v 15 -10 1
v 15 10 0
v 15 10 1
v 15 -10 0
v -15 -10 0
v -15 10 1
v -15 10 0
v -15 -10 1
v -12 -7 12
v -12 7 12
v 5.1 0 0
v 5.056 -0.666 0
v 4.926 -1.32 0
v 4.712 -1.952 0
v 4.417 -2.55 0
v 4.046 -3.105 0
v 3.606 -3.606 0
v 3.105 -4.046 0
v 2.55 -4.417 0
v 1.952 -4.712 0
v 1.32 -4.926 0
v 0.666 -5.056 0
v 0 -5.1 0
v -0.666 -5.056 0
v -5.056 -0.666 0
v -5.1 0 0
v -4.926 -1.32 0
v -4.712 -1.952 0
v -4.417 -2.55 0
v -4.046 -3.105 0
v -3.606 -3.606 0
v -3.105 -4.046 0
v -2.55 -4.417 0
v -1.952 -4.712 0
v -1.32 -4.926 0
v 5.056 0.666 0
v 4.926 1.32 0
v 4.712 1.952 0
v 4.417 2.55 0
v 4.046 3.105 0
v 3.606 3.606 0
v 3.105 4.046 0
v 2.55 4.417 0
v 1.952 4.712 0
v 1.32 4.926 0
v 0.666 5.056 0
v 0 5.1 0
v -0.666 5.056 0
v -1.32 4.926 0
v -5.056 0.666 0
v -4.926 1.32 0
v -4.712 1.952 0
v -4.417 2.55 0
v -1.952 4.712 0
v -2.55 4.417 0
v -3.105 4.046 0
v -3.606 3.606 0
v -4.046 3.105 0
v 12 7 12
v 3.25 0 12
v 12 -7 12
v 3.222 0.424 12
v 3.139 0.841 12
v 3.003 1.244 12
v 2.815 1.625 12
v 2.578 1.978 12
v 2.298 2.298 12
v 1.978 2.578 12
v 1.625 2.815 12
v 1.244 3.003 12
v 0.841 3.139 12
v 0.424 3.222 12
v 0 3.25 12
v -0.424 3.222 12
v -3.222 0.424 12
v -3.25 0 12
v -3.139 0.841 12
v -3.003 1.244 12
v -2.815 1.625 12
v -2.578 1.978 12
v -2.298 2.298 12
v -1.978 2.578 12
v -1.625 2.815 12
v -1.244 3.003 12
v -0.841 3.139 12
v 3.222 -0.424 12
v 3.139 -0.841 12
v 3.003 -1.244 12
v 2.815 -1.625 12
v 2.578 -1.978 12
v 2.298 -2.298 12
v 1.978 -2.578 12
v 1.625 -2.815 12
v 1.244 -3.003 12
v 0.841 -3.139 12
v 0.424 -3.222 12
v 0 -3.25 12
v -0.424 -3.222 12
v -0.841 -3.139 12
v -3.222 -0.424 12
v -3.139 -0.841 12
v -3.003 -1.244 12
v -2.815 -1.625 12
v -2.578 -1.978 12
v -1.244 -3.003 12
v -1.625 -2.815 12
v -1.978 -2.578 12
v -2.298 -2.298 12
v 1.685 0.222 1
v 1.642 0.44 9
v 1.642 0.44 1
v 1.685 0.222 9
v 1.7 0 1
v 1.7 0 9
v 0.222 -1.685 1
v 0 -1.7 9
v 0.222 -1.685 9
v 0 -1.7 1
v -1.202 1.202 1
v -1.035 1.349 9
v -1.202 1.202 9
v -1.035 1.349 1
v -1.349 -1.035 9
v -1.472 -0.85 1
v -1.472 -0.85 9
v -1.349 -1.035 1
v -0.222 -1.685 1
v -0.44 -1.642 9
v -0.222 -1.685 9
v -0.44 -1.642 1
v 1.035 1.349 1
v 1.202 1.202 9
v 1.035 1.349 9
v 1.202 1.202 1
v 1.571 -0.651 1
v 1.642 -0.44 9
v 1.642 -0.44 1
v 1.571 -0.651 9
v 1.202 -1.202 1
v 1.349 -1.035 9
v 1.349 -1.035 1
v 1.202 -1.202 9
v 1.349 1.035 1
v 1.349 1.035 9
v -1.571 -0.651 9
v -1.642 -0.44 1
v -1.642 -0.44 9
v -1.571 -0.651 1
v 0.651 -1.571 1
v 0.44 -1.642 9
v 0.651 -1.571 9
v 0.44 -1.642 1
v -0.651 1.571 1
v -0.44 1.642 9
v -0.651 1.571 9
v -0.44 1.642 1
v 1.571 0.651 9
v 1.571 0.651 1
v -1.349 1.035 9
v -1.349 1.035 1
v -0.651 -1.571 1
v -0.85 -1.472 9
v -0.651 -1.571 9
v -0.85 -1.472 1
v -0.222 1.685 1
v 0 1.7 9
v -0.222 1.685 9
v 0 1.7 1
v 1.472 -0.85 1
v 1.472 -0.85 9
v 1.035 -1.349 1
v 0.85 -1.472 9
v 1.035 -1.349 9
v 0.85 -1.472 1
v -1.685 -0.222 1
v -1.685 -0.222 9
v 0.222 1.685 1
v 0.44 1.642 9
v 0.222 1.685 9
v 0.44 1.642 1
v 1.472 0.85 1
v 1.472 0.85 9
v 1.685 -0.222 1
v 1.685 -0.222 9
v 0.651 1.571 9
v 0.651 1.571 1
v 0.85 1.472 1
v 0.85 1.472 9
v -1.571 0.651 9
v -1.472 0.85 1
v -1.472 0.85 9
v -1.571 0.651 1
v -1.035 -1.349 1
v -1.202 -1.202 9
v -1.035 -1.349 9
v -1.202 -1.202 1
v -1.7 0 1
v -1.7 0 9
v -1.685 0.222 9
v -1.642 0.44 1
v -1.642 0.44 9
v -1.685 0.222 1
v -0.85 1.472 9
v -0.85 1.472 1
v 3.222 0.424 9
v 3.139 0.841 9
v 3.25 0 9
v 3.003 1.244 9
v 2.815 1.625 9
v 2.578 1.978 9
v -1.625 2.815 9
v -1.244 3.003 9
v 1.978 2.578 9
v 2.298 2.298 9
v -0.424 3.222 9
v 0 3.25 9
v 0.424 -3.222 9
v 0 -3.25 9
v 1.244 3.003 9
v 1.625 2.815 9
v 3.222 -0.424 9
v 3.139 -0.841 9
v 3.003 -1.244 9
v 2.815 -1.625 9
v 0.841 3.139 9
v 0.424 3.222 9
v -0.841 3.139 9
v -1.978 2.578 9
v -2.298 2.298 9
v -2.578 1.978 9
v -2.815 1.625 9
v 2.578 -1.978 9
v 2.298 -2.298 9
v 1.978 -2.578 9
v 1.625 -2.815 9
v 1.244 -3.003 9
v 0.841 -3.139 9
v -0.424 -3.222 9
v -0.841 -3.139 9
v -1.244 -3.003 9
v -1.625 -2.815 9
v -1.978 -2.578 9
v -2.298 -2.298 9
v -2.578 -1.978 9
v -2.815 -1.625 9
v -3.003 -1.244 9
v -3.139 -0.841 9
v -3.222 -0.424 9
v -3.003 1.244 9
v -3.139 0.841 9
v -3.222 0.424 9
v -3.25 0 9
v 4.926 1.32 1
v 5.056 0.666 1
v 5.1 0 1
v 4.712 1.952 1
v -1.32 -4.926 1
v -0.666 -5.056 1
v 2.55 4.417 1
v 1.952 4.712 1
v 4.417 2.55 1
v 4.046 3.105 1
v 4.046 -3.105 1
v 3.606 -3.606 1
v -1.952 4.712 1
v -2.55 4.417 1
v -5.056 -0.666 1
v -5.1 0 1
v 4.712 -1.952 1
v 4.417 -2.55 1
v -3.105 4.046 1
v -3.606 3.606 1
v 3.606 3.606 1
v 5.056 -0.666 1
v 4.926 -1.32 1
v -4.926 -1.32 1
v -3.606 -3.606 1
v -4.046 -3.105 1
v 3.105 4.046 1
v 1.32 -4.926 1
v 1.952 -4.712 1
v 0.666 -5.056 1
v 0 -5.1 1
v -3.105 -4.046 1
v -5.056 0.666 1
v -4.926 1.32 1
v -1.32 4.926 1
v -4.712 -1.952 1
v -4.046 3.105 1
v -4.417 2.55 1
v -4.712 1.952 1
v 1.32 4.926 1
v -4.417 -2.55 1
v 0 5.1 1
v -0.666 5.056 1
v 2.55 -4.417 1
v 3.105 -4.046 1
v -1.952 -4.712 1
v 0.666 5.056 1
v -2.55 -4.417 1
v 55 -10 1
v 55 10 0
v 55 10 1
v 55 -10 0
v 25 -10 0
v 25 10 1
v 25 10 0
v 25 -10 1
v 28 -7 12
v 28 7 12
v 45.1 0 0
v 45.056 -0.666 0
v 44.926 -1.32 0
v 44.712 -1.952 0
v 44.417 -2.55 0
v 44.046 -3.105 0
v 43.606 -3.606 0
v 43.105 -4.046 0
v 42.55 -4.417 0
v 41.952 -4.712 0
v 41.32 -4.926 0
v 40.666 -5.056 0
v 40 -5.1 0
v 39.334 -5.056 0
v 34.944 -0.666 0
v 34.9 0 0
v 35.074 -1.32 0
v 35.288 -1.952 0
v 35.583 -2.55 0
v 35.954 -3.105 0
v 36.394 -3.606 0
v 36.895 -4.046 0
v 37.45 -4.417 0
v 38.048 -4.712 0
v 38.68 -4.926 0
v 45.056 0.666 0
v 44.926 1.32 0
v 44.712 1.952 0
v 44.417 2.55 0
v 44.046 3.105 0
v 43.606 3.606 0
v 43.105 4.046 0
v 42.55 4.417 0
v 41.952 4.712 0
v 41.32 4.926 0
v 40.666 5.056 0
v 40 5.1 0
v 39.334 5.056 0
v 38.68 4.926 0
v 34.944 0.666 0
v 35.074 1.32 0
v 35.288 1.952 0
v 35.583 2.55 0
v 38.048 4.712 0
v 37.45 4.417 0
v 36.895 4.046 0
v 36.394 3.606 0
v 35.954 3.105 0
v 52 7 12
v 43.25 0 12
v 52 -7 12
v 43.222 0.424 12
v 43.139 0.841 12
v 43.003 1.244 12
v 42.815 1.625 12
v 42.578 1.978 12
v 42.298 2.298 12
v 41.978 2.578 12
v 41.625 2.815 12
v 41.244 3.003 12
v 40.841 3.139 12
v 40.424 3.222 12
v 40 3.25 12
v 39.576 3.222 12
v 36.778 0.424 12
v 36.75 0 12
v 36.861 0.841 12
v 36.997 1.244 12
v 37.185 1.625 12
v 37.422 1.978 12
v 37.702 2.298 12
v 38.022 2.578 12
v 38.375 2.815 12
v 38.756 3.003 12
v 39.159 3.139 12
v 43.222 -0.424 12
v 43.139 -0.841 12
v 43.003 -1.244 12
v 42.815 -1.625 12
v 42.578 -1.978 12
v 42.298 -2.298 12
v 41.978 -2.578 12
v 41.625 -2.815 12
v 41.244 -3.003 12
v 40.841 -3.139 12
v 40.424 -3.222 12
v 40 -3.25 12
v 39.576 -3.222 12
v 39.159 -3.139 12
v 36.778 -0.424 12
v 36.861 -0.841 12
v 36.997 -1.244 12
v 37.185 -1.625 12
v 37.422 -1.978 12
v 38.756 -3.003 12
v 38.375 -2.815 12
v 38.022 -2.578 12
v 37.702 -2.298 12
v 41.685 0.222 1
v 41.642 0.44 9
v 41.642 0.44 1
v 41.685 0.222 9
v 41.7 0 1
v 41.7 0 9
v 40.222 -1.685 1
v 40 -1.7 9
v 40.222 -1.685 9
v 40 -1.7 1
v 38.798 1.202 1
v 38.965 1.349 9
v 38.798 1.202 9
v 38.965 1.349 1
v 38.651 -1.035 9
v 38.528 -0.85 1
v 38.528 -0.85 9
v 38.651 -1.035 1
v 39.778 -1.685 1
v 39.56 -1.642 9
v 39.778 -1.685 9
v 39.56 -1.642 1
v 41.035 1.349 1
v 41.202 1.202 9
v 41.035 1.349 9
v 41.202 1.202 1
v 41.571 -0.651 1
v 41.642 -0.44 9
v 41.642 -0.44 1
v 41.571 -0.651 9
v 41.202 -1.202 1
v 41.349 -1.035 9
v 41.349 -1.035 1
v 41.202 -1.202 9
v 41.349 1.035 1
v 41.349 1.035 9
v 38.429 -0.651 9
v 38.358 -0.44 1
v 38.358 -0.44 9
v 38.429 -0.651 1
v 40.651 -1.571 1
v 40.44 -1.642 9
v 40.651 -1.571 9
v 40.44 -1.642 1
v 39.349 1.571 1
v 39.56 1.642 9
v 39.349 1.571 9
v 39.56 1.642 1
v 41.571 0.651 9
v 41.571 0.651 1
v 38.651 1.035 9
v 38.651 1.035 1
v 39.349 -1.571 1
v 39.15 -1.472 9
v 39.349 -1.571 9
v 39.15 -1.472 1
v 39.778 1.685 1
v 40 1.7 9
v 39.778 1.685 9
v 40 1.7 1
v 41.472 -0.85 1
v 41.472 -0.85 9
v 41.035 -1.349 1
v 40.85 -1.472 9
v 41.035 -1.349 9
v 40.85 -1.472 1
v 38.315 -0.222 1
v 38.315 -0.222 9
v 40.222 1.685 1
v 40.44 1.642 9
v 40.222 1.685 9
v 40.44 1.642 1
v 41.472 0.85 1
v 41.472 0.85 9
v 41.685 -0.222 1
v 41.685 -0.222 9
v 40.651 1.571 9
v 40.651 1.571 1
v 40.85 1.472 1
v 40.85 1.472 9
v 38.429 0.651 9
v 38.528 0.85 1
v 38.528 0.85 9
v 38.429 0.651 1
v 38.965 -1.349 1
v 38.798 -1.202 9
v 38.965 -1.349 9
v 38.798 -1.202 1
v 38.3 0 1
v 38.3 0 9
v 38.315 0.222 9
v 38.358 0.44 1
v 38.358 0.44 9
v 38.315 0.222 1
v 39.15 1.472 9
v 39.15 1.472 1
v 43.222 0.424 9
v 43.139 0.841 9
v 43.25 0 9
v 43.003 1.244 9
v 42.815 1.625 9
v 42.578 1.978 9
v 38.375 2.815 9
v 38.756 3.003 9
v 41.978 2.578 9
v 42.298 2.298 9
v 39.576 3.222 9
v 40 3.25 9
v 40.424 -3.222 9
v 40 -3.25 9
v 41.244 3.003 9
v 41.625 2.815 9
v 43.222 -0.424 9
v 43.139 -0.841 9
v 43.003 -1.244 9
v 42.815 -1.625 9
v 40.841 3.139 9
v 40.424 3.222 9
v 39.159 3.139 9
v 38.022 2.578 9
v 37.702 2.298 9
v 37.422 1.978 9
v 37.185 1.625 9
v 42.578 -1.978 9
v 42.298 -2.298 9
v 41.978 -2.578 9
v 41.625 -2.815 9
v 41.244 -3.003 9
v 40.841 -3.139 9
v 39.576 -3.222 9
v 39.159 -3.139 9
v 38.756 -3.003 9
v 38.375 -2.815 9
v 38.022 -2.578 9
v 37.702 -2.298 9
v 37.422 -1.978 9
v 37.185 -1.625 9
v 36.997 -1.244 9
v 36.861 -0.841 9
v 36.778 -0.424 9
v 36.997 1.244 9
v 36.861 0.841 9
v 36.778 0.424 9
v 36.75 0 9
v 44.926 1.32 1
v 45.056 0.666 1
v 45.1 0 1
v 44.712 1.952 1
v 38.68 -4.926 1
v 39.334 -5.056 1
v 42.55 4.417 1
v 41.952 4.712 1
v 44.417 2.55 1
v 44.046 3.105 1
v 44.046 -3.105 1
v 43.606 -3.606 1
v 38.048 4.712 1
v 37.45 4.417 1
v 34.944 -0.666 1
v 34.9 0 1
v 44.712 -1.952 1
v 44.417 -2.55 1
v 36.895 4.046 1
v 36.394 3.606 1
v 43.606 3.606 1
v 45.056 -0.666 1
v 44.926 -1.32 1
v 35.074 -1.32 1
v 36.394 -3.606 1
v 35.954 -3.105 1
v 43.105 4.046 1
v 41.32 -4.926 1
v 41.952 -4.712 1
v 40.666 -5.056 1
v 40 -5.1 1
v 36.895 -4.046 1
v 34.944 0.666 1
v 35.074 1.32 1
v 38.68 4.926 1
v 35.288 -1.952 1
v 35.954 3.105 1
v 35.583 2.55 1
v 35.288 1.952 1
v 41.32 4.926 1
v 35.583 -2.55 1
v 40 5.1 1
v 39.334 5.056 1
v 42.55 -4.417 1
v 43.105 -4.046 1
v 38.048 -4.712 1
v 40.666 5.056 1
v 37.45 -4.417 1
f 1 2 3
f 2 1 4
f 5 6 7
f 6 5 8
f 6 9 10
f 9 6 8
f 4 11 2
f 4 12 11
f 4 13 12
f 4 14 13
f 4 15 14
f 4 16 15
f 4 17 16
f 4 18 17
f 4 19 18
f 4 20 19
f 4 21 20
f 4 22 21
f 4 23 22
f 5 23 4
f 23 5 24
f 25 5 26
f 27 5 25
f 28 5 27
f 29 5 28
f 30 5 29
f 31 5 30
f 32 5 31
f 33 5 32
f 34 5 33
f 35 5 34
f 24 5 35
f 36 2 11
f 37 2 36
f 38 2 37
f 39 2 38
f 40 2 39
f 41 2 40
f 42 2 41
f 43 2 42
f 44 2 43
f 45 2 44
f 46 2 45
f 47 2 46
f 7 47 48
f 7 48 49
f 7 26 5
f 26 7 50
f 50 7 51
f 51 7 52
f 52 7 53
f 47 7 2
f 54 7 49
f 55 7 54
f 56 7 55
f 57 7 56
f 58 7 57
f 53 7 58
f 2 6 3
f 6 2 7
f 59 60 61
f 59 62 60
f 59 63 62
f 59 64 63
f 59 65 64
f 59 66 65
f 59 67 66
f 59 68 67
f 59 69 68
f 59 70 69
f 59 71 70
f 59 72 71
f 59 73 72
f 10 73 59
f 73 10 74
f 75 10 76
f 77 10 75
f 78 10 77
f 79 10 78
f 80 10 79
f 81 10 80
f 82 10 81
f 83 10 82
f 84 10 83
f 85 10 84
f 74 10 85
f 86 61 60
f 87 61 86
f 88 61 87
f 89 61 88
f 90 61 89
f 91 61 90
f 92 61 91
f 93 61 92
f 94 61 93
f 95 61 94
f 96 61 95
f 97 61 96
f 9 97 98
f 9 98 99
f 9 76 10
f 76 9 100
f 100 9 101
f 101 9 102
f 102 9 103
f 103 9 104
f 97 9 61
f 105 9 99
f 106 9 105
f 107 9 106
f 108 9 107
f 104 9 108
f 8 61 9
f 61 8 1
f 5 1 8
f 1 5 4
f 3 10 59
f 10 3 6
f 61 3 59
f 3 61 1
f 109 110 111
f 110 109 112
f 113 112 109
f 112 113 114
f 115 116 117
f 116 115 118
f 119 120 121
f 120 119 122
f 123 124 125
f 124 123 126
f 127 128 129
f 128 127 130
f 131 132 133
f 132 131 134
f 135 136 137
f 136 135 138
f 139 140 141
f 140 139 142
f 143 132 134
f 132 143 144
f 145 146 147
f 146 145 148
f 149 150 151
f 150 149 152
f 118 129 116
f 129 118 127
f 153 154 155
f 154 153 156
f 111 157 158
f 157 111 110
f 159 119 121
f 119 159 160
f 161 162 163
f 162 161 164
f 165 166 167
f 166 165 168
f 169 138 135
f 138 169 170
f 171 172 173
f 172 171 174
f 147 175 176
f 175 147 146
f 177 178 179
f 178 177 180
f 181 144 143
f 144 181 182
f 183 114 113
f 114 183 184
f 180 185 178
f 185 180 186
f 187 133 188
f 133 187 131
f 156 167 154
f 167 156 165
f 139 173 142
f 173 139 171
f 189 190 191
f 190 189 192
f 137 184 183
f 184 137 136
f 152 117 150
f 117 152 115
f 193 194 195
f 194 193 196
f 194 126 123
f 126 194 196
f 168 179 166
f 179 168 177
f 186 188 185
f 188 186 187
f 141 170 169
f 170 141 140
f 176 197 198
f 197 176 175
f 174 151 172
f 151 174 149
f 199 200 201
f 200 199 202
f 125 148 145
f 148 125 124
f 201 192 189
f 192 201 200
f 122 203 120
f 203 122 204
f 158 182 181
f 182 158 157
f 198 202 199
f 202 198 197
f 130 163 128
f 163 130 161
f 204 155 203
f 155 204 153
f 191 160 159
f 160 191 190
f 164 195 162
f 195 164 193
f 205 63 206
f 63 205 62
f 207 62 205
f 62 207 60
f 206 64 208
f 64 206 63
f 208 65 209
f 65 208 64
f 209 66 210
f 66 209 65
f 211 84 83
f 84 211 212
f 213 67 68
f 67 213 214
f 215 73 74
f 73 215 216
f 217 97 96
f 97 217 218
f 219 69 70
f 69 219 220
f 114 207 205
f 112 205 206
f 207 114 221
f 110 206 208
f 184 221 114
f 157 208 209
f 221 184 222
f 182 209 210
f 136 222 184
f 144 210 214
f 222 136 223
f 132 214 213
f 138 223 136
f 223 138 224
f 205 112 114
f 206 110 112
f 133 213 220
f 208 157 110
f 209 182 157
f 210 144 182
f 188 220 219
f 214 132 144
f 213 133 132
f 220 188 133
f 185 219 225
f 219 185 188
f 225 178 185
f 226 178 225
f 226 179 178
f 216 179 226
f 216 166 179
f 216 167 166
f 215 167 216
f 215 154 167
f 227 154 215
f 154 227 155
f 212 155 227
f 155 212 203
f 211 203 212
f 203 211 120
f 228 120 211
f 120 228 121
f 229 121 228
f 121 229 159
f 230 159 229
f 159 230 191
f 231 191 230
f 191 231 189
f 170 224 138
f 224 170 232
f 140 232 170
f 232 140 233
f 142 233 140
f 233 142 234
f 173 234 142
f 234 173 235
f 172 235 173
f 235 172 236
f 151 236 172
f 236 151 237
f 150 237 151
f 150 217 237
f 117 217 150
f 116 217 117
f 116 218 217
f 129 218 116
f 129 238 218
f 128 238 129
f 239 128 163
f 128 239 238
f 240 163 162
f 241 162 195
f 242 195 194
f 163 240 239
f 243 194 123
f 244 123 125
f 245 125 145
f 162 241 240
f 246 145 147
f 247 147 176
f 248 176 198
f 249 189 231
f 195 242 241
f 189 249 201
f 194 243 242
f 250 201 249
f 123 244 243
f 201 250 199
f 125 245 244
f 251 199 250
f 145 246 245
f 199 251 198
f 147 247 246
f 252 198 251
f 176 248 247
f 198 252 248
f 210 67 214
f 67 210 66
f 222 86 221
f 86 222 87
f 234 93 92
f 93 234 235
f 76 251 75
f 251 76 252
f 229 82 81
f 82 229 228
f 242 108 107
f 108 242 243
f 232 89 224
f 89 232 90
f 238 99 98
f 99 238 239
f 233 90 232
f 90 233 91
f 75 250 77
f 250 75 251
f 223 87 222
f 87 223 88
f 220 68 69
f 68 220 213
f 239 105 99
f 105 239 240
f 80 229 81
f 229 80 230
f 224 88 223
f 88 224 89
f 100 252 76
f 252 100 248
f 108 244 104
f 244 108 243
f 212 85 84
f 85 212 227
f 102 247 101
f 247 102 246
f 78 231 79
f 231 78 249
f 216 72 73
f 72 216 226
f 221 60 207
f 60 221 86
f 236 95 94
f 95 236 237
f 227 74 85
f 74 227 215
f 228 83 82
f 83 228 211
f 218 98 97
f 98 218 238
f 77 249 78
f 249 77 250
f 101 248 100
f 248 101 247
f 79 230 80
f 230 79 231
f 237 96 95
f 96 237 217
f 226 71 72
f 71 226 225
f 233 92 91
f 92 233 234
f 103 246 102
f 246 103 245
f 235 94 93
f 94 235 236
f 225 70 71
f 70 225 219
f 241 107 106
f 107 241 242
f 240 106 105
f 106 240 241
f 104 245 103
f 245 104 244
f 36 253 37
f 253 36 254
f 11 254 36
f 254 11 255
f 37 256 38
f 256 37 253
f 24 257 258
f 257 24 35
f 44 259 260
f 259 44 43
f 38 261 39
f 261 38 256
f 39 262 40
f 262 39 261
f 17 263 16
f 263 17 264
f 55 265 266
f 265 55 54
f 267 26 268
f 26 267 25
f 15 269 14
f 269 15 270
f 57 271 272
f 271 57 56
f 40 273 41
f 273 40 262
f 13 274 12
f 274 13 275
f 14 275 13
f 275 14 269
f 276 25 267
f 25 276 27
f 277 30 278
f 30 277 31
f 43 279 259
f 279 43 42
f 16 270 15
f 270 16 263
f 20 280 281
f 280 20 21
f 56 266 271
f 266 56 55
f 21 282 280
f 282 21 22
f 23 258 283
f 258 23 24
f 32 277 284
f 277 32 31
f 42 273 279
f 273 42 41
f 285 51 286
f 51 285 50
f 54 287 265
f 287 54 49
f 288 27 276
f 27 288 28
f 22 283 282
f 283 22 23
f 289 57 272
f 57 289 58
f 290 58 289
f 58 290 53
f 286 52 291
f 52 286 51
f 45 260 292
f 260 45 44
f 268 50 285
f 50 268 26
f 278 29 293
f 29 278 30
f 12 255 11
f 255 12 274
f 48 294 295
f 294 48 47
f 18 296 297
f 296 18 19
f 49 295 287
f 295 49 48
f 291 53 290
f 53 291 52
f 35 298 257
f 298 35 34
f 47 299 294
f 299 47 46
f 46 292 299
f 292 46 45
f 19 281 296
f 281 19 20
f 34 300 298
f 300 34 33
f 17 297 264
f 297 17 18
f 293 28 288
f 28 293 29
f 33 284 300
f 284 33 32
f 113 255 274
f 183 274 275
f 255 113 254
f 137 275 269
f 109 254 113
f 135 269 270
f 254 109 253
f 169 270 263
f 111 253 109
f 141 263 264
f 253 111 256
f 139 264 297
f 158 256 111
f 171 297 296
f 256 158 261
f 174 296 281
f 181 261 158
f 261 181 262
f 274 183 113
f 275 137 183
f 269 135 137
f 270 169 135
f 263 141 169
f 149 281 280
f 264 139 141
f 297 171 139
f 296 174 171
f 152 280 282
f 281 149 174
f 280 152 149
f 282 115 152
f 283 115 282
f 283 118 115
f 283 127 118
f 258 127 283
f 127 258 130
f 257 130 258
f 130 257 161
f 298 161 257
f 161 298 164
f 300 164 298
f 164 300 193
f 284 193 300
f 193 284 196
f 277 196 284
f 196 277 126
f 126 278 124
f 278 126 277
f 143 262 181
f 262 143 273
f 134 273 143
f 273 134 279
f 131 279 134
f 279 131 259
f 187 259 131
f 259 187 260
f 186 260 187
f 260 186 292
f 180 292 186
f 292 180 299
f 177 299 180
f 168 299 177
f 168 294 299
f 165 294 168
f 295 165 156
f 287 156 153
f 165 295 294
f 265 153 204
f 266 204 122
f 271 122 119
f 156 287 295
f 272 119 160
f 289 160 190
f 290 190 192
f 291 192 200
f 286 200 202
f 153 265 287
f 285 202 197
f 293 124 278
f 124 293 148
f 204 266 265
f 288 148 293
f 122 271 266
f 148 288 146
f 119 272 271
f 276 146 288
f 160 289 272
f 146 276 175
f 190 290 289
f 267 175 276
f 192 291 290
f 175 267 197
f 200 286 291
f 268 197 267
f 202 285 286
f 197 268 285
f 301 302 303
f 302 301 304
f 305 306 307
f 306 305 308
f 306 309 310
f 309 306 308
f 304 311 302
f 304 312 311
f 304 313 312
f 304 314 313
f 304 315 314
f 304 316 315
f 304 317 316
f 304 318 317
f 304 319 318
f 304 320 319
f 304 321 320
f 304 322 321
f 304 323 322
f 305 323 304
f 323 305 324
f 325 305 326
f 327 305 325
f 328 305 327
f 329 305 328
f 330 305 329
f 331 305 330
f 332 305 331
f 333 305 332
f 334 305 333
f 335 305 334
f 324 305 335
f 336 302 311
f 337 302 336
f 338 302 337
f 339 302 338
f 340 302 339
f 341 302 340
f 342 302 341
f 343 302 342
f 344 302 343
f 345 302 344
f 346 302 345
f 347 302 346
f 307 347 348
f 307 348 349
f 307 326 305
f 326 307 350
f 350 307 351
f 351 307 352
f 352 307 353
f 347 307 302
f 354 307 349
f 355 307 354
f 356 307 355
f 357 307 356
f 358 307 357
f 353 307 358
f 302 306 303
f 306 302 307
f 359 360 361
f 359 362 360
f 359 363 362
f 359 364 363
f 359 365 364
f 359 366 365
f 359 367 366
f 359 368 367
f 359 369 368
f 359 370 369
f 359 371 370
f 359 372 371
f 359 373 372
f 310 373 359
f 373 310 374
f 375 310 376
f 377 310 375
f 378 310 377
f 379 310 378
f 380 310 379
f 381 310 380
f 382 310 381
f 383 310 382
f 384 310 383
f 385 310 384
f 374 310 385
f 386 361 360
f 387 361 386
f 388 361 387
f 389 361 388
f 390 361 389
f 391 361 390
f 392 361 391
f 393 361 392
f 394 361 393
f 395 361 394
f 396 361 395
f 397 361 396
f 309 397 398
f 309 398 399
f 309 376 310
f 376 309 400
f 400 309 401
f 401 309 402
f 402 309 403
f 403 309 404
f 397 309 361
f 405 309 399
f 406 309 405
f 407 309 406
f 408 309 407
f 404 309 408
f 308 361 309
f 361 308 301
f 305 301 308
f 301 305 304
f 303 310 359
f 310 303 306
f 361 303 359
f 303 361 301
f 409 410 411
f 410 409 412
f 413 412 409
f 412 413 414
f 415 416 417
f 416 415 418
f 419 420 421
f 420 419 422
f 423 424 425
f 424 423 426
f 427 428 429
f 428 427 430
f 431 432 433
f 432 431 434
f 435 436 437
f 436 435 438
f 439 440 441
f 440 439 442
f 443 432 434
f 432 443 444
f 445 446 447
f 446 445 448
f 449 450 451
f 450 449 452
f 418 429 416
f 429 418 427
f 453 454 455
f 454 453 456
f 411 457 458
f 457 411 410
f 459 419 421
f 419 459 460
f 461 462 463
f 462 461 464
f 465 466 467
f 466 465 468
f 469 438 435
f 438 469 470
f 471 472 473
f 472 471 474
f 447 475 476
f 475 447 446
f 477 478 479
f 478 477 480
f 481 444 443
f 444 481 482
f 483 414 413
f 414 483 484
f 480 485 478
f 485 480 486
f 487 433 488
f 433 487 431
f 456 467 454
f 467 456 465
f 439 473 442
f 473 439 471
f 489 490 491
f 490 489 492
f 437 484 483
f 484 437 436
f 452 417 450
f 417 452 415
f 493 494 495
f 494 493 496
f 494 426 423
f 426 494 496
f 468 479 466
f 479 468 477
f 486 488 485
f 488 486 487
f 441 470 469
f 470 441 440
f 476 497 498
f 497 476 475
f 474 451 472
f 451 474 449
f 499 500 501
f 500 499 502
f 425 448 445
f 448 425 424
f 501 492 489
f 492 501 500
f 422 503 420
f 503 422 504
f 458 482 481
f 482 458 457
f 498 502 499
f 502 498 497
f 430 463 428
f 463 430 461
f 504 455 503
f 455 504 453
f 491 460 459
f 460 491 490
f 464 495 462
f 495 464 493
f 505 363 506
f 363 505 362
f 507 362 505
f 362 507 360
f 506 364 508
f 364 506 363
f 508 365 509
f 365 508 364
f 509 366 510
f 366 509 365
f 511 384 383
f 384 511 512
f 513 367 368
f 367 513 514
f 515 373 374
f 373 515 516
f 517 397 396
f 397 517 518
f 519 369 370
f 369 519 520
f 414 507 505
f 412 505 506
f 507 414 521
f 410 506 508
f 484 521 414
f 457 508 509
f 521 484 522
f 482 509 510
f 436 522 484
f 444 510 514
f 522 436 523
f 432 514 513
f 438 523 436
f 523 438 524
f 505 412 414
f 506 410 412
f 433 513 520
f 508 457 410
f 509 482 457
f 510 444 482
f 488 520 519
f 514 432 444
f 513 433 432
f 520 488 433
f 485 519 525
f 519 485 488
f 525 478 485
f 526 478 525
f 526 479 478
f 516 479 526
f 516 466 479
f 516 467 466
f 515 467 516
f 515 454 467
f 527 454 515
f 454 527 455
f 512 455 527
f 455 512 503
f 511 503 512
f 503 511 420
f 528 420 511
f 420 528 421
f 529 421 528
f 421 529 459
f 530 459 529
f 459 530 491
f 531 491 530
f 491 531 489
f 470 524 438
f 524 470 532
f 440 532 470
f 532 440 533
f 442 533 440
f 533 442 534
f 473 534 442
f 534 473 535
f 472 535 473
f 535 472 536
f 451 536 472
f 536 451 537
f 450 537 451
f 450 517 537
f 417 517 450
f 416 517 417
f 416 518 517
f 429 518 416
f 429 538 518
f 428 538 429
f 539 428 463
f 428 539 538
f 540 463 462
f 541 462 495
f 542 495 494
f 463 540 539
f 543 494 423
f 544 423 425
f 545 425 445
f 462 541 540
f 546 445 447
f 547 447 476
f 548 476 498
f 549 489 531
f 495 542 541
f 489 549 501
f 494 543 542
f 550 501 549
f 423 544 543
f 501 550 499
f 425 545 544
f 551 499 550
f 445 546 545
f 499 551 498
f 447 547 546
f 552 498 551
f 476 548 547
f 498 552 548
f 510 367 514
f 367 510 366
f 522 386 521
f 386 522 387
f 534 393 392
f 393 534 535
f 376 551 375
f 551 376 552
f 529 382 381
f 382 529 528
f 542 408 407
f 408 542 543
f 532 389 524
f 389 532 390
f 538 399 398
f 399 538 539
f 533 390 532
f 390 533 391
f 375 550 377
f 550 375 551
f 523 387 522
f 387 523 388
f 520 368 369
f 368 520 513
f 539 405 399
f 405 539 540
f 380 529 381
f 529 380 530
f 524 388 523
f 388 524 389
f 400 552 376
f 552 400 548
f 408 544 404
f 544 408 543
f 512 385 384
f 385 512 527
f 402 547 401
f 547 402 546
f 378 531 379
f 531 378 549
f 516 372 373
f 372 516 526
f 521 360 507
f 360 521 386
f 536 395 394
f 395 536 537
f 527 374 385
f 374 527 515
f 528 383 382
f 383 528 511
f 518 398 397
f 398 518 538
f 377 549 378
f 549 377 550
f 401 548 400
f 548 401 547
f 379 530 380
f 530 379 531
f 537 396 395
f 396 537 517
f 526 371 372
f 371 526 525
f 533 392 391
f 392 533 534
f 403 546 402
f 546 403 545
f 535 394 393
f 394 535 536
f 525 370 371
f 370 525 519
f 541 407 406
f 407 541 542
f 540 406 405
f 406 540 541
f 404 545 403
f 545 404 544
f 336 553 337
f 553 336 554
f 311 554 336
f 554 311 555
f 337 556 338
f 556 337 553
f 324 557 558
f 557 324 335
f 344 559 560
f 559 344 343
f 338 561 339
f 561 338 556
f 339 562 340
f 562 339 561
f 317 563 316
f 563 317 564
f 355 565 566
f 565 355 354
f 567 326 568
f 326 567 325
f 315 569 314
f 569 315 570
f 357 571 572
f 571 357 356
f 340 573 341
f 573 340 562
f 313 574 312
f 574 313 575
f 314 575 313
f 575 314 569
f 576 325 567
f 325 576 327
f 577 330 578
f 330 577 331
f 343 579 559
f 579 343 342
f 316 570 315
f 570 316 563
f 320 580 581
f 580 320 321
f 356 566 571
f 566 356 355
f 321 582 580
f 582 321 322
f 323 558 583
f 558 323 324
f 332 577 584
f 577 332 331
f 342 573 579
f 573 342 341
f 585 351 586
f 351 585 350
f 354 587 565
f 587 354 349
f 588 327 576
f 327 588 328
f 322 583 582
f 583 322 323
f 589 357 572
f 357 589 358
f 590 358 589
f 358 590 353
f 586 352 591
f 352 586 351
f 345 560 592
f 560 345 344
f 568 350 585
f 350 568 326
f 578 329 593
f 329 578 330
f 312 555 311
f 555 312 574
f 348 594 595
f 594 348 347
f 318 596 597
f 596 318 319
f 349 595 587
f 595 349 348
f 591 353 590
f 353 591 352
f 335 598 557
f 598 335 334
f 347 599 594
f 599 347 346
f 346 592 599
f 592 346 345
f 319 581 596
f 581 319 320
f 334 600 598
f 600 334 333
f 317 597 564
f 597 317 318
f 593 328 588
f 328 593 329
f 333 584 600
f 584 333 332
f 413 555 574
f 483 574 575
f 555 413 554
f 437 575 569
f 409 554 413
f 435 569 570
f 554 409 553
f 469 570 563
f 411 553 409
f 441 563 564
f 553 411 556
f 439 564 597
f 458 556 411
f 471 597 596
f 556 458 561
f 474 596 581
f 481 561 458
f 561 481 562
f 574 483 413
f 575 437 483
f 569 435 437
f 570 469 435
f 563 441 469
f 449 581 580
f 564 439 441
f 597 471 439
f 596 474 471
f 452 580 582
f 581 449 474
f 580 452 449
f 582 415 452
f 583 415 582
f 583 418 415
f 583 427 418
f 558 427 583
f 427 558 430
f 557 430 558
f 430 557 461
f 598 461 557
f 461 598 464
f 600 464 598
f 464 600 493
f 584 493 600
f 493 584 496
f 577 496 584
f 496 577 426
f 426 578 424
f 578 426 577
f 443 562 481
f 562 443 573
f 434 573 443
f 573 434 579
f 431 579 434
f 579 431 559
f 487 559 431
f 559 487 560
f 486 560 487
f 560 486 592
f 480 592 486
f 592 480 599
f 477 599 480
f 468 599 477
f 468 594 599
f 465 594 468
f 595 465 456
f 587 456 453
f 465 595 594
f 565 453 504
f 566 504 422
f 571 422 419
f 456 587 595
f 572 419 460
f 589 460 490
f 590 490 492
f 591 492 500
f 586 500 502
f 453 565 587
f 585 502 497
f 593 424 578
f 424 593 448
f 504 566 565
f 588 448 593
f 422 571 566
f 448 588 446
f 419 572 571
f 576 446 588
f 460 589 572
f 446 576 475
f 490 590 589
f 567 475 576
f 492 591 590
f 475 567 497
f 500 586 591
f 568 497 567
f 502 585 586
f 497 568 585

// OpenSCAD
// file: params.scad
/*
 * params.scad — every dimension the printed parts share, in millimetres.
 * ======================================================================
 * Included by all cad/*.scad files. No dimension may be duplicated in a part
 * file; if two parts need the same number, it lives here.
 *
 * Values marked MEASURE are design targets until caliper measurements of a real
 * X240 top section replace them (issue #44). Everything else is a design choice.
 */

// ---------------------------------------------------------------- deck / case
case_width  = 309.0;   // MEASURE  X, left to right, at the deck's mating surface
case_depth  = 210.0;   // MEASURE  Y, front (palmrest) to back
wall_t      = 2.5;     // PETG shell wall
corner_r    = 3.0;     // MEASURE  outer corner radius
internal_h  = 18.0;    // floor-to-deck clearance (see docs/enclosure/integration.md)
case_h      = internal_h + wall_t;

// Screw bosses that meet the X240 deck, from the front-left corner.  MEASURE all.
deck_boss_positions = [
    [  8.0,   8.0 ], [ 60.0,   8.0 ], [150.0,   8.0 ], [250.0,   8.0 ], [301.0,   8.0 ],
    [  8.0, 202.0 ], [150.0, 202.0 ], [301.0, 202.0 ],
];
boss_od = 6.0;
boss_id = 3.2;         // M2 heat-set insert hole (insert OD ~3.2 for a 3.5 mm body)

// ---------------------------------------------------------------- split joint
split      = true;     // print as two halves (fits a 220 mm bed); false = one piece
split_x    = case_width / 2;
tab_count  = 3;        // dovetail tabs along the floor seam
tab_w      = 14.0;     // tab width at the seam
tab_flare  = 3.0;      // extra width at the tip (dovetail angle)
tab_len    = 10.0;     // how far the tab reaches into the other half
joint_gap  = 0.15;     // clearance per face; tune with a 30 mm coupon
pin_d      = 3.0;      // alignment pins through the front/rear walls
pin_len    = 10.0;

// ---------------------------------------------------------------- board / sled
board_w    = 100.0;    // stripboard or Rev B PCB
board_d    = 80.0;
board_hole_inset = 4.0;                  // M2 holes this far from each board corner
board_hole_d     = 2.4;
sled_margin      = 6.0;                  // sled extends this far past the board
sled_t           = 2.0;
sled_standoff_h  = 6.0;                  // board sits this high above the sled
sled_standoff_od = 5.0;
// sled centre in the case (rear-centre; see docs/enclosure/integration.md)
sled_center = [ case_width / 2, case_depth - 8 - board_d / 2 - sled_margin - 6 ];
// sled-to-case bosses (around the sled, two per half so the sled bridges the seam)
sled_boss_offsets = [ [-56, -46], [56, -46], [-56, 46], [56, 46] ];

// ---------------------------------------------------------------- Pico
pico_w = 51.0;
pico_d = 21.0;
pico_h = 1.0;          // PCB thickness
pico_hole_d = 2.1;     // Pico mounting holes, 11.4 x 47 mm pattern
pico_hole_dx = 47.0;
pico_hole_dy = 11.4;

// ---------------------------------------------------------------- USB
usb_c     = false;                     // false = Micro-USB cutout, true = USB-C
usb_w     = usb_c ? 9.5 : 8.5;
usb_h     = usb_c ? 4.0 : 3.5;
usb_x     = sled_center[0];            // cutout centred on the board
usb_z     = wall_t + sled_t + sled_standoff_h + 1.6;   // bottom of the Pico's connector
cable_d   = 4.5;                       // USB cable jacket diameter
relief_w  = 22.0;                      // strain-relief bezel footprint
relief_d  = 12.0;
relief_h  = 10.0;

// ---------------------------------------------------------------- FPC
fpc_w        = 22.0;   // 40-pin 0.5 mm cable width
fpc_t        = 0.3;
fpc_min_r    = 5.0;    // minimum bend radius
clickpad_fpc_w = 8.0;  // MEASURE  ClickPad cable width
zif_body_w   = 26.0;   // 40-pin ZIF connector body length along the cable edge
zif_body_d   = 6.0;
zif_body_h   = 5.0;
zif_cp_body_w = 12.0;  // ClickPad ZIF body (pin count from probing)

// ---------------------------------------------------------------- gasket, vents, feet
gasket_depth = 1.2;
gasket_width = 2.0;
vents        = false;  // not thermally needed (docs/enclosure/durability.md)
vent_w = 40.0; vent_h = 2.0; vent_count = 4; vent_spacing = 6.0;
ribs         = true;   // two front-to-back stiffening ribs in the floor
rib_t        = 2.0;
rib_h        = 4.0;

foot_d       = 10.0;   // rubber feet, front
foot_recess  = 1.0;
foot_positions = [ [25, 20], [case_width - 25, 20] ];
tilt_positions = [ [25, case_depth - 20], [case_width - 25, case_depth - 20] ];
tilt_h       = 12.0;   // rear riser height
tilt_w       = 30.0;
tilt_d       = 20.0;
tilt_screw_d = 3.4;    // M3 clearance

// ---------------------------------------------------------------- LED light pipe
pipe_d       = 3.0;
pipe_flange_d= 5.0;
pipe_len     = internal_h - 2;
pipe_position = [ sled_center[0] + board_w / 2 + 15, sled_center[1] - 20 ];  // beside the touchpad

// ---------------------------------------------------------------- printing
fit      = 0.2;        // general hole clearance for printed-in-place fits
$fn      = 48;
// main file
/*
 * tilt_feet.scad — rear risers for a typing angle
 * ===============================================
 * Two wedge feet bolted through the rear floor (tilt_positions in params.scad)
 * with M3 screws; a recess on the underside takes a 10 mm rubber pad.
 */
include <params.scad>

module tilt_foot() {
    difference() {
        hull() {
            translate([-tilt_w / 2, -tilt_d / 2, 0]) cube([tilt_w, tilt_d, 1]);
            translate([-tilt_w / 2 + 3, -tilt_d / 2 + 3, tilt_h - 1]) cube([tilt_w - 6, tilt_d - 6, 1]);
        }
        translate([0, 0, -1]) cylinder(h = tilt_h + 2, d = tilt_screw_d);
        translate([0, 0, tilt_h - 3]) cylinder(h = 4, d = 6.5);              // screw head pocket (top, meets the case)
        translate([0, 0, -1]) cylinder(h = foot_recess + 1, d = foot_d + fit);  // rubber pad recess (bottom)
    }
}

tilt_foot();
translate([tilt_w + 10, 0, 0]) tilt_foot();
